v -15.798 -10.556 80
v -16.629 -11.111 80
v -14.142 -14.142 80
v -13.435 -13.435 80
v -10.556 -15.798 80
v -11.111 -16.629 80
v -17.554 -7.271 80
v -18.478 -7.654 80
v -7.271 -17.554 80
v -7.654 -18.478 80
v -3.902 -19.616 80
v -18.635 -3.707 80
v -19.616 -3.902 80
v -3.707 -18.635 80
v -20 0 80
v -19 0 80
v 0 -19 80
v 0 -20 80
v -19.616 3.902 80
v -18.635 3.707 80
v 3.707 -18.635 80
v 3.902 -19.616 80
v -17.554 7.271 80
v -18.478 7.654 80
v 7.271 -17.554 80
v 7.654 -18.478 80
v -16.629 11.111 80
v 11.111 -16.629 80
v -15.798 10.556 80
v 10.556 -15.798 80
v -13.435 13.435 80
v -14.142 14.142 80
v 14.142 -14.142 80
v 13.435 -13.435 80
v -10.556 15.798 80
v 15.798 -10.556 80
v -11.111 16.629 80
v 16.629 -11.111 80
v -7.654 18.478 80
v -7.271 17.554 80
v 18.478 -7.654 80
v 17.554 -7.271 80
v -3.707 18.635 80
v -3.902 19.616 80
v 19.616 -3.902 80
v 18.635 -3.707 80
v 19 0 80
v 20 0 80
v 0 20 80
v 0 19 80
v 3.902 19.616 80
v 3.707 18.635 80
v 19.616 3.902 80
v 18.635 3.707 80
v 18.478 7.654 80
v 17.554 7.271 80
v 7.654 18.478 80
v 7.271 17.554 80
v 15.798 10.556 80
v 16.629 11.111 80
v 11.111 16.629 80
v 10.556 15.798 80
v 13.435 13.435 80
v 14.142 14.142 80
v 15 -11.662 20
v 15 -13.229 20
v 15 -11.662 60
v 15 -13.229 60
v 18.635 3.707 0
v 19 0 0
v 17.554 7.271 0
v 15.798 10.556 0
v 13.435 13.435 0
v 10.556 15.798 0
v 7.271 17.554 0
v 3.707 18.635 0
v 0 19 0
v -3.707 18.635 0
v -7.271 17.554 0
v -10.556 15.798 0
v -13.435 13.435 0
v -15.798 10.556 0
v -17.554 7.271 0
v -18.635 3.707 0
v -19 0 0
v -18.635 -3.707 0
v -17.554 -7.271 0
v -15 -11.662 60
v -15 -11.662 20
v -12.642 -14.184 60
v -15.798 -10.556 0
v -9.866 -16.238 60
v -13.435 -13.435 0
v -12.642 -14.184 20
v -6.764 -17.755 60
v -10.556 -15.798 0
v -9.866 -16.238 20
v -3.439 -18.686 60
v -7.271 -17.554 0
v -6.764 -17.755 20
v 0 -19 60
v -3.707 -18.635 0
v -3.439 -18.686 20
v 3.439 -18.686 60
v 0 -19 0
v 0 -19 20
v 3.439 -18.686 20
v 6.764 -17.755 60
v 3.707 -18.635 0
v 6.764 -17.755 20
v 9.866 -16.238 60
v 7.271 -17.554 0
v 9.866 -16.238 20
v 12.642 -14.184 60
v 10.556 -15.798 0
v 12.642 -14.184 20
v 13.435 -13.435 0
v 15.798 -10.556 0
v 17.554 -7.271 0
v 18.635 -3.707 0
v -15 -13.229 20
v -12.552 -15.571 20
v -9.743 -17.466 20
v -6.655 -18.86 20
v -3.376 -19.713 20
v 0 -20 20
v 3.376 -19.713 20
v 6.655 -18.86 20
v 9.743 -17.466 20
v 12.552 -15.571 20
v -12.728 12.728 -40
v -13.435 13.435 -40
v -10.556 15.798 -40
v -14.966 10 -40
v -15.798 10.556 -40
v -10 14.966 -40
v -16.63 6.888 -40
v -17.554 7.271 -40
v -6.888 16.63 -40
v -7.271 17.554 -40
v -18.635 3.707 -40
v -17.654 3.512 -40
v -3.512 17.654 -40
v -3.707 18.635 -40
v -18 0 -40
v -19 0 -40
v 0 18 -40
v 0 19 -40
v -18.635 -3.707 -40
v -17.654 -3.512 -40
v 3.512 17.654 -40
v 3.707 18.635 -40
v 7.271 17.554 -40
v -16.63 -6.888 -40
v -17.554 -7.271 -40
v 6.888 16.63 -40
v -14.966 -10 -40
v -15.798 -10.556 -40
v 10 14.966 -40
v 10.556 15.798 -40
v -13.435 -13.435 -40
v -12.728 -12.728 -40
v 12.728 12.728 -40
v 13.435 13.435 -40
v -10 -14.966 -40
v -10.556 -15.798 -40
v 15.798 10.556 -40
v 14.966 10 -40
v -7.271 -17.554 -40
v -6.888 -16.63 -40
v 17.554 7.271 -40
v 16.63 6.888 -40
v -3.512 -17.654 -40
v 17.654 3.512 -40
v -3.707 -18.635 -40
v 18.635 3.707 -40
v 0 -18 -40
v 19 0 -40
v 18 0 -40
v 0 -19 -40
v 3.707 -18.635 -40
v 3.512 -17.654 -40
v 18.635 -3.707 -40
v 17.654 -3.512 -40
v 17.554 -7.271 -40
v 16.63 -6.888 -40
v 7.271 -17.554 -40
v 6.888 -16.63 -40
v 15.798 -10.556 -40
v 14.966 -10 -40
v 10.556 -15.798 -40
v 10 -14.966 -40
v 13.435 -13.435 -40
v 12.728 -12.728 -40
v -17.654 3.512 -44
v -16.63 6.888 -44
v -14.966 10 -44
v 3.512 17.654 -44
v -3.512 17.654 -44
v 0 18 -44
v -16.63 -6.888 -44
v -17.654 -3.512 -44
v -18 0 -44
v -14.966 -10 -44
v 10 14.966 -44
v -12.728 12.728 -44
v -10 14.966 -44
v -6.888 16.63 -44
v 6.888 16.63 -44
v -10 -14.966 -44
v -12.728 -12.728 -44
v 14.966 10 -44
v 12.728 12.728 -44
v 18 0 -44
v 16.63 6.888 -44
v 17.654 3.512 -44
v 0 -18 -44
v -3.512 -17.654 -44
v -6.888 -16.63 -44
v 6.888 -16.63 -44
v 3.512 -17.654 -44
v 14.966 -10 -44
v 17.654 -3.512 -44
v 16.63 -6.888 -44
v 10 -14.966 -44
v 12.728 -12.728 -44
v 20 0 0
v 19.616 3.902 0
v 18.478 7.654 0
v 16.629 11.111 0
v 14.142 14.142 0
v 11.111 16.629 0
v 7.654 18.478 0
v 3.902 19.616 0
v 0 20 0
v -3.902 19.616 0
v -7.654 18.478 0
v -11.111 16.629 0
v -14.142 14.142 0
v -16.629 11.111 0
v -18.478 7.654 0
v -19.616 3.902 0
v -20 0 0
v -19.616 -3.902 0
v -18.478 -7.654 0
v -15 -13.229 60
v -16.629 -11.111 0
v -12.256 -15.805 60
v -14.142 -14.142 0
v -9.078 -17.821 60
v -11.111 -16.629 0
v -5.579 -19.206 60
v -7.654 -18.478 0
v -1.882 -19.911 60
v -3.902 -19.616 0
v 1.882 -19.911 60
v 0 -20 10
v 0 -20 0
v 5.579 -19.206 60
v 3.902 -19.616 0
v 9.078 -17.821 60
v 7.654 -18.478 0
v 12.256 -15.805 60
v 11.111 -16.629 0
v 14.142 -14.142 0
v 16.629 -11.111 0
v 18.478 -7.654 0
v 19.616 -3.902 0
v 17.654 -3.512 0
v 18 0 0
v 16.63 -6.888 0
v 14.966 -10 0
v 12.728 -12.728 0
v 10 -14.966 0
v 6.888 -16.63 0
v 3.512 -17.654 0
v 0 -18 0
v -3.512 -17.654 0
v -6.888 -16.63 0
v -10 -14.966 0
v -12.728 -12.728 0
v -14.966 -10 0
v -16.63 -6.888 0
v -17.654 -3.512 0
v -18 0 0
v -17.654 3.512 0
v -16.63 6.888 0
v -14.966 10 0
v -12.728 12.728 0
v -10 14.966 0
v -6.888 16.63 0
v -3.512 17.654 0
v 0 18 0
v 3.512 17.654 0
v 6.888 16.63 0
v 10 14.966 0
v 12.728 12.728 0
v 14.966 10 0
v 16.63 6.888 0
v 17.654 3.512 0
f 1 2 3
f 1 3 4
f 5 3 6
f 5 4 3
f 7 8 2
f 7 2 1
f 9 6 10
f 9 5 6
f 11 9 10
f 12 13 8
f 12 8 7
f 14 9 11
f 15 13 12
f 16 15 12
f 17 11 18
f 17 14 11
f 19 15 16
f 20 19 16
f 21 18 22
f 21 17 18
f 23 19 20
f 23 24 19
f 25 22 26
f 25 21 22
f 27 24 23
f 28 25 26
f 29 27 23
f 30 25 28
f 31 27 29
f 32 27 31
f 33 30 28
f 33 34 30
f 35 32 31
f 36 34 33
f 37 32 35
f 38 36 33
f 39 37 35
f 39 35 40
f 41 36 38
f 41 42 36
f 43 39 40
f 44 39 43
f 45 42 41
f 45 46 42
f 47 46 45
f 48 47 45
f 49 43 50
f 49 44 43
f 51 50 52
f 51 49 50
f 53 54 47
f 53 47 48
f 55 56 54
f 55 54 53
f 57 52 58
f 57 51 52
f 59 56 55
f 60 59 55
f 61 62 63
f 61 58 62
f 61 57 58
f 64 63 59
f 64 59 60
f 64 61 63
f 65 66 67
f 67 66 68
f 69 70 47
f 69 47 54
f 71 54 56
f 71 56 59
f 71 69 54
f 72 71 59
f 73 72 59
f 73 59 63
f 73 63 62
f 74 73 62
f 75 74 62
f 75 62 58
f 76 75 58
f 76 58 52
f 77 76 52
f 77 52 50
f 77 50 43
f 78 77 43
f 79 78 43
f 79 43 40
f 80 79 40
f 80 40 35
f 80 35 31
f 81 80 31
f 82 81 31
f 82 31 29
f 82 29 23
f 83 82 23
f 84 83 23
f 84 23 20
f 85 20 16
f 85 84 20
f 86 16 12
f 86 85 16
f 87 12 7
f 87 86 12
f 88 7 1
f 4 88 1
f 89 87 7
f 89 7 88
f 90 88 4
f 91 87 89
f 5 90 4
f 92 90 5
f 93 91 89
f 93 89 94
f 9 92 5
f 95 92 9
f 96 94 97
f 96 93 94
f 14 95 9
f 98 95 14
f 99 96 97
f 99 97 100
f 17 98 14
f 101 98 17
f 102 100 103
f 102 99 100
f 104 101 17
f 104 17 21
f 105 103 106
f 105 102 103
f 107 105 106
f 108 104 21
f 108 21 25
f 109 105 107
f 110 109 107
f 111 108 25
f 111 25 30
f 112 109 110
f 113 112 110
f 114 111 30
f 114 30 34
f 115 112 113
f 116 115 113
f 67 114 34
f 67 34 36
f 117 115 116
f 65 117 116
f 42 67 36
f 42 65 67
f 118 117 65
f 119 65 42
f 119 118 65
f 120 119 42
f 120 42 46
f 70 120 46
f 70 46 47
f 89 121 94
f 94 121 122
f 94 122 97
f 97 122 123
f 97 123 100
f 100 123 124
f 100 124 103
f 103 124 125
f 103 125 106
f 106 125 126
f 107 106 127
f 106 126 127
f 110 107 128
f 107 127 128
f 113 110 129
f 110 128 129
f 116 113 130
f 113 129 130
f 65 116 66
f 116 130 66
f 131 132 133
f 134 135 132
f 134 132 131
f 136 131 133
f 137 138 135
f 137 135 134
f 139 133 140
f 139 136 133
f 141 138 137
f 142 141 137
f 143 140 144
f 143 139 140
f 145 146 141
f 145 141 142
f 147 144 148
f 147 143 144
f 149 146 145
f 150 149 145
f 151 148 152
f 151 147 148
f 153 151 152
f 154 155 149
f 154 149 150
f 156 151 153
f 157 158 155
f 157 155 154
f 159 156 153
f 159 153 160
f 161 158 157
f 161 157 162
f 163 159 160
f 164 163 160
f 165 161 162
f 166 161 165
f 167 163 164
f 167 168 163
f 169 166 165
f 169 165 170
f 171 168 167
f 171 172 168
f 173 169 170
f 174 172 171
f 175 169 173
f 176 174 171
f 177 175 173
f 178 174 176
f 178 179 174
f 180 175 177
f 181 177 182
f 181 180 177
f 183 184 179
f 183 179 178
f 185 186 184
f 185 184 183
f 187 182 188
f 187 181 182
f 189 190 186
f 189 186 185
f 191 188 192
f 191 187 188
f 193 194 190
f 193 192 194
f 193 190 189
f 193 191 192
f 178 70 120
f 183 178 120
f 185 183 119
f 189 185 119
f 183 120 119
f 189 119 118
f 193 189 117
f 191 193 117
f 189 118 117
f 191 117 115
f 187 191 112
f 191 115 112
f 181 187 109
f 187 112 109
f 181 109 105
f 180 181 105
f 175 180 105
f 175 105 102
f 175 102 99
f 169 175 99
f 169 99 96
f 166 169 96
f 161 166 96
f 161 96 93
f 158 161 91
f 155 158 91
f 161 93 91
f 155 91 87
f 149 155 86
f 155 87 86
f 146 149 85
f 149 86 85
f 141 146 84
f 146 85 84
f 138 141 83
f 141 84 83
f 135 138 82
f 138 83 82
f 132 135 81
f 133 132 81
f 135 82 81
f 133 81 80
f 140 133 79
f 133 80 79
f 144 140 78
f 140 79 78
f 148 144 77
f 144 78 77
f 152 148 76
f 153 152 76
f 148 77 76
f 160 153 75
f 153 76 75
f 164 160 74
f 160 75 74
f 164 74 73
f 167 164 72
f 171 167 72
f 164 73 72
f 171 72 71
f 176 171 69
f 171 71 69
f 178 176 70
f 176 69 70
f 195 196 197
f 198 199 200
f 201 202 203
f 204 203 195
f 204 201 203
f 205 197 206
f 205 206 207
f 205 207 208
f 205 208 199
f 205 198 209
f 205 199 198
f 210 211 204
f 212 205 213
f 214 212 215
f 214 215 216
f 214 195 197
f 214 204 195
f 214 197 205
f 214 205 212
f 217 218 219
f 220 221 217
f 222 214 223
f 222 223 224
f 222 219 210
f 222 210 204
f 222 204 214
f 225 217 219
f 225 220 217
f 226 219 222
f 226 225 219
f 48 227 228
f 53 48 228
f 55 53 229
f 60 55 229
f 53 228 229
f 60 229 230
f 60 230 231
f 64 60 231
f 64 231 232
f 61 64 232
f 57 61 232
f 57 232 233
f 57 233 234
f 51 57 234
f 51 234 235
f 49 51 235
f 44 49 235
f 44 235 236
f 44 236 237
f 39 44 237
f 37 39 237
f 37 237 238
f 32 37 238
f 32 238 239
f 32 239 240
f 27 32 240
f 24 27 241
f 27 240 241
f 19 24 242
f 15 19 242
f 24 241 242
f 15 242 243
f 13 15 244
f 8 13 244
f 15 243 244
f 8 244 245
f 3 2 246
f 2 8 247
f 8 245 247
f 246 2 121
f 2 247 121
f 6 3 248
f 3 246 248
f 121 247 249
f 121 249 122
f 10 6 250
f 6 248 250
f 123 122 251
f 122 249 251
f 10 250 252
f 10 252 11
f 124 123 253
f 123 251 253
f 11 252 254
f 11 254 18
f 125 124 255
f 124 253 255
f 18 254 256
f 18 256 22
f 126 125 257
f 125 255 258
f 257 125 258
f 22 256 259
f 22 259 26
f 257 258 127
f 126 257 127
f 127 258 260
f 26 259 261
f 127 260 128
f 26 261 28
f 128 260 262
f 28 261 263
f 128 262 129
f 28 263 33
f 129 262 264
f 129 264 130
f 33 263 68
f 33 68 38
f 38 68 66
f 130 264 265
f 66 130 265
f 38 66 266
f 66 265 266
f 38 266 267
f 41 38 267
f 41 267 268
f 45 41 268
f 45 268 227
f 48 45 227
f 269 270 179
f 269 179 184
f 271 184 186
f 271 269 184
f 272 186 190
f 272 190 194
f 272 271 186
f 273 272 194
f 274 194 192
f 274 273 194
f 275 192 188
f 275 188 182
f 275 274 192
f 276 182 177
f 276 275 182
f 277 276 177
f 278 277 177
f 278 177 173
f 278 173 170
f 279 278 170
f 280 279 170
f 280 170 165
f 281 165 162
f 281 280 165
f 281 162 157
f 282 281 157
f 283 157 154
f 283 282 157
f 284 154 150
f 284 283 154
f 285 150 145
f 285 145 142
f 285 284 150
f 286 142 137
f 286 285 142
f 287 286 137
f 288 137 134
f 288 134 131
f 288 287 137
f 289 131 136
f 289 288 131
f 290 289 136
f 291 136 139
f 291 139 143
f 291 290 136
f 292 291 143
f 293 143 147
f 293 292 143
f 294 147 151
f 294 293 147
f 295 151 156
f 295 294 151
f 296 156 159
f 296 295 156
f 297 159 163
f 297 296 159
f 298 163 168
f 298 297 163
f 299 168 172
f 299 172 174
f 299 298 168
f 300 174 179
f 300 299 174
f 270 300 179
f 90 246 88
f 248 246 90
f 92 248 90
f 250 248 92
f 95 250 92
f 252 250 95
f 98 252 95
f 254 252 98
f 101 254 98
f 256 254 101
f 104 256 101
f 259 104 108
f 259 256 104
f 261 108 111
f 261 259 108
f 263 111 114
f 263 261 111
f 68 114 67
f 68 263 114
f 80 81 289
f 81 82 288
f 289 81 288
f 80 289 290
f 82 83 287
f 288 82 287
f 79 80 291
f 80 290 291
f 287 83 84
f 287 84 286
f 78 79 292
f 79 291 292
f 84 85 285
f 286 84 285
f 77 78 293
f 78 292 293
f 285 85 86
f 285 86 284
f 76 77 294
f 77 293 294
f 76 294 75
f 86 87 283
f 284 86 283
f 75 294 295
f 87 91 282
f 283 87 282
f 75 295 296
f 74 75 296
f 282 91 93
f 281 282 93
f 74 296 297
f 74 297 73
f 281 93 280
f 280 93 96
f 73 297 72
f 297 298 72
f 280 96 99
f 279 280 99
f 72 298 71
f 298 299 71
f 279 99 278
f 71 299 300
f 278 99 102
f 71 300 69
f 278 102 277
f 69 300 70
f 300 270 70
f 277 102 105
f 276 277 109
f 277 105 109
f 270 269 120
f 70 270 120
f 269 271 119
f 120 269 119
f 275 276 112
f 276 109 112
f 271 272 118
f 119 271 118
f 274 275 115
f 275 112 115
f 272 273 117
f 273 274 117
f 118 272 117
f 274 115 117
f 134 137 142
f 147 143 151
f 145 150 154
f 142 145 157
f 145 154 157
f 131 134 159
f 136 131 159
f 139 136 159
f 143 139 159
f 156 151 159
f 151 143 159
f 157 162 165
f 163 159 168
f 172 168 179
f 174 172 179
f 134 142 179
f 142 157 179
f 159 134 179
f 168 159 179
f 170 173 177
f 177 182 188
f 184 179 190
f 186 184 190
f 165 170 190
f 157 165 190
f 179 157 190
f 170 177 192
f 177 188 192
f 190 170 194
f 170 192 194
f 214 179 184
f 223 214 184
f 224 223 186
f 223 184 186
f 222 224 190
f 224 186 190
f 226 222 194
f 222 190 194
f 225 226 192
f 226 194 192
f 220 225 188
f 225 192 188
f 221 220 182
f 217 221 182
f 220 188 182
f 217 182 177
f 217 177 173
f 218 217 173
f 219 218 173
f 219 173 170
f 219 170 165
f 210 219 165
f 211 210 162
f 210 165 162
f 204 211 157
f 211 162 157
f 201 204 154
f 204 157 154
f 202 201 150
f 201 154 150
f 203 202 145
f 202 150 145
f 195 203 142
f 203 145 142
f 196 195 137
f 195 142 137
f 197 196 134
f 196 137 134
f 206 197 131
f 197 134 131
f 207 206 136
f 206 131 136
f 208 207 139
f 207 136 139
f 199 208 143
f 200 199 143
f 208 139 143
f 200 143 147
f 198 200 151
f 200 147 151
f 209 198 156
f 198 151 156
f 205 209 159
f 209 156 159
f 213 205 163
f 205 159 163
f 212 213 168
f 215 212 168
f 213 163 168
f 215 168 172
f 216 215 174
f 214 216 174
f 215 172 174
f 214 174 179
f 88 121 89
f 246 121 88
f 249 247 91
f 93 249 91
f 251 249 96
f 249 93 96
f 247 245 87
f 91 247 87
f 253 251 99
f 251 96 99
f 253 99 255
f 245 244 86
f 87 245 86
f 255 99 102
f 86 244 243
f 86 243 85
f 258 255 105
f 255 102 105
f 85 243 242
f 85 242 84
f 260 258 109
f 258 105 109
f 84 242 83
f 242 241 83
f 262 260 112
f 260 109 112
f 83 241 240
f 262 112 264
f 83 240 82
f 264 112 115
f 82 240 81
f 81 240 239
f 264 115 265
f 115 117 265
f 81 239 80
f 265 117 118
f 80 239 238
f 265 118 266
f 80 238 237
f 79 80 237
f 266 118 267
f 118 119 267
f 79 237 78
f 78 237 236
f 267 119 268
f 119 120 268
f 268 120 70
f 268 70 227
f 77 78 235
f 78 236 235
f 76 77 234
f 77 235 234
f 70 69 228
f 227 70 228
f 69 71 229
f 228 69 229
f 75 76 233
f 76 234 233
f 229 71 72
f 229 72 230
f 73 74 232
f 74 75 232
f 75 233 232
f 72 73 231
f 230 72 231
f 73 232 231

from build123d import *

# Parameters (mm, degrees)
F0_R      = 20
F0_R_2    = 19
F1_DEPTH  = 80
F3_W      = 30
F3_H      = 40
F4_DEPTH  = 25
F5_R      = 20
F6_DEPTH  = 60
F7_W      = 25
F7_H      = 35
F8_DEPTH  = 10
F10_R     = 19
F10_R_2   = 18
F11_DEPTH = 40
F12_R     = 18
F13_DEPTH = 4


with BuildPart() as f1:
    # F0 (on Top) → F1 (new body)
    with BuildSketch(Plane.XY):
        Circle(F0_R)
        Circle(F0_R_2, mode=Mode.SUBTRACT)
    extrude(amount=F1_DEPTH)

    # F3 (on offset) → F4 (cut)
    with BuildSketch(Plane.XZ.offset(20)):
        with Locations((0, 40)):
            Rectangle(F3_W, F3_H)
    extrude(amount=-F4_DEPTH, mode=Mode.SUBTRACT)

    # F7 (on offset) → F8 (cut)
    with BuildSketch(Plane.XZ.offset(20)):
        with Locations((0, 27.5)):
            Rectangle(F7_W, F7_H)
    extrude(amount=F8_DEPTH, mode=Mode.SUBTRACT)


with BuildPart() as f6:
    # F5 (on face) → F6 (new body)
    with BuildSketch(Plane(origin=(0, 0, 0), x_dir=(1, 0, 0), z_dir=(0, 0, -1))):
        Circle(F5_R)
        with BuildLine():
            ThreePointArc((-19, 0), (0, 19), (19, 0))
            ThreePointArc((19, 0), (0, -19), (-19, 0))
        make_face(mode=Mode.SUBTRACT)
    extrude(amount=-F6_DEPTH)


with BuildPart() as f11:
    # F10 (on face) → F11 (new body)
    with BuildSketch(Plane(origin=(0, 0, 0), x_dir=(1, 0, 0), z_dir=(0, 0, -1))):
        Circle(F10_R)
        Circle(F10_R_2, mode=Mode.SUBTRACT)
    extrude(amount=F11_DEPTH)


with BuildPart() as f13:
    # F12 (on face) → F13 (new body)
    with BuildSketch(Plane(origin=(0, 0, -40), x_dir=(1, 0, 0), z_dir=(0, 0, -1))):
        Circle(F12_R)
    extrude(amount=F13_DEPTH)


solid = Compound([f1.part, f11.part, f13.part])
